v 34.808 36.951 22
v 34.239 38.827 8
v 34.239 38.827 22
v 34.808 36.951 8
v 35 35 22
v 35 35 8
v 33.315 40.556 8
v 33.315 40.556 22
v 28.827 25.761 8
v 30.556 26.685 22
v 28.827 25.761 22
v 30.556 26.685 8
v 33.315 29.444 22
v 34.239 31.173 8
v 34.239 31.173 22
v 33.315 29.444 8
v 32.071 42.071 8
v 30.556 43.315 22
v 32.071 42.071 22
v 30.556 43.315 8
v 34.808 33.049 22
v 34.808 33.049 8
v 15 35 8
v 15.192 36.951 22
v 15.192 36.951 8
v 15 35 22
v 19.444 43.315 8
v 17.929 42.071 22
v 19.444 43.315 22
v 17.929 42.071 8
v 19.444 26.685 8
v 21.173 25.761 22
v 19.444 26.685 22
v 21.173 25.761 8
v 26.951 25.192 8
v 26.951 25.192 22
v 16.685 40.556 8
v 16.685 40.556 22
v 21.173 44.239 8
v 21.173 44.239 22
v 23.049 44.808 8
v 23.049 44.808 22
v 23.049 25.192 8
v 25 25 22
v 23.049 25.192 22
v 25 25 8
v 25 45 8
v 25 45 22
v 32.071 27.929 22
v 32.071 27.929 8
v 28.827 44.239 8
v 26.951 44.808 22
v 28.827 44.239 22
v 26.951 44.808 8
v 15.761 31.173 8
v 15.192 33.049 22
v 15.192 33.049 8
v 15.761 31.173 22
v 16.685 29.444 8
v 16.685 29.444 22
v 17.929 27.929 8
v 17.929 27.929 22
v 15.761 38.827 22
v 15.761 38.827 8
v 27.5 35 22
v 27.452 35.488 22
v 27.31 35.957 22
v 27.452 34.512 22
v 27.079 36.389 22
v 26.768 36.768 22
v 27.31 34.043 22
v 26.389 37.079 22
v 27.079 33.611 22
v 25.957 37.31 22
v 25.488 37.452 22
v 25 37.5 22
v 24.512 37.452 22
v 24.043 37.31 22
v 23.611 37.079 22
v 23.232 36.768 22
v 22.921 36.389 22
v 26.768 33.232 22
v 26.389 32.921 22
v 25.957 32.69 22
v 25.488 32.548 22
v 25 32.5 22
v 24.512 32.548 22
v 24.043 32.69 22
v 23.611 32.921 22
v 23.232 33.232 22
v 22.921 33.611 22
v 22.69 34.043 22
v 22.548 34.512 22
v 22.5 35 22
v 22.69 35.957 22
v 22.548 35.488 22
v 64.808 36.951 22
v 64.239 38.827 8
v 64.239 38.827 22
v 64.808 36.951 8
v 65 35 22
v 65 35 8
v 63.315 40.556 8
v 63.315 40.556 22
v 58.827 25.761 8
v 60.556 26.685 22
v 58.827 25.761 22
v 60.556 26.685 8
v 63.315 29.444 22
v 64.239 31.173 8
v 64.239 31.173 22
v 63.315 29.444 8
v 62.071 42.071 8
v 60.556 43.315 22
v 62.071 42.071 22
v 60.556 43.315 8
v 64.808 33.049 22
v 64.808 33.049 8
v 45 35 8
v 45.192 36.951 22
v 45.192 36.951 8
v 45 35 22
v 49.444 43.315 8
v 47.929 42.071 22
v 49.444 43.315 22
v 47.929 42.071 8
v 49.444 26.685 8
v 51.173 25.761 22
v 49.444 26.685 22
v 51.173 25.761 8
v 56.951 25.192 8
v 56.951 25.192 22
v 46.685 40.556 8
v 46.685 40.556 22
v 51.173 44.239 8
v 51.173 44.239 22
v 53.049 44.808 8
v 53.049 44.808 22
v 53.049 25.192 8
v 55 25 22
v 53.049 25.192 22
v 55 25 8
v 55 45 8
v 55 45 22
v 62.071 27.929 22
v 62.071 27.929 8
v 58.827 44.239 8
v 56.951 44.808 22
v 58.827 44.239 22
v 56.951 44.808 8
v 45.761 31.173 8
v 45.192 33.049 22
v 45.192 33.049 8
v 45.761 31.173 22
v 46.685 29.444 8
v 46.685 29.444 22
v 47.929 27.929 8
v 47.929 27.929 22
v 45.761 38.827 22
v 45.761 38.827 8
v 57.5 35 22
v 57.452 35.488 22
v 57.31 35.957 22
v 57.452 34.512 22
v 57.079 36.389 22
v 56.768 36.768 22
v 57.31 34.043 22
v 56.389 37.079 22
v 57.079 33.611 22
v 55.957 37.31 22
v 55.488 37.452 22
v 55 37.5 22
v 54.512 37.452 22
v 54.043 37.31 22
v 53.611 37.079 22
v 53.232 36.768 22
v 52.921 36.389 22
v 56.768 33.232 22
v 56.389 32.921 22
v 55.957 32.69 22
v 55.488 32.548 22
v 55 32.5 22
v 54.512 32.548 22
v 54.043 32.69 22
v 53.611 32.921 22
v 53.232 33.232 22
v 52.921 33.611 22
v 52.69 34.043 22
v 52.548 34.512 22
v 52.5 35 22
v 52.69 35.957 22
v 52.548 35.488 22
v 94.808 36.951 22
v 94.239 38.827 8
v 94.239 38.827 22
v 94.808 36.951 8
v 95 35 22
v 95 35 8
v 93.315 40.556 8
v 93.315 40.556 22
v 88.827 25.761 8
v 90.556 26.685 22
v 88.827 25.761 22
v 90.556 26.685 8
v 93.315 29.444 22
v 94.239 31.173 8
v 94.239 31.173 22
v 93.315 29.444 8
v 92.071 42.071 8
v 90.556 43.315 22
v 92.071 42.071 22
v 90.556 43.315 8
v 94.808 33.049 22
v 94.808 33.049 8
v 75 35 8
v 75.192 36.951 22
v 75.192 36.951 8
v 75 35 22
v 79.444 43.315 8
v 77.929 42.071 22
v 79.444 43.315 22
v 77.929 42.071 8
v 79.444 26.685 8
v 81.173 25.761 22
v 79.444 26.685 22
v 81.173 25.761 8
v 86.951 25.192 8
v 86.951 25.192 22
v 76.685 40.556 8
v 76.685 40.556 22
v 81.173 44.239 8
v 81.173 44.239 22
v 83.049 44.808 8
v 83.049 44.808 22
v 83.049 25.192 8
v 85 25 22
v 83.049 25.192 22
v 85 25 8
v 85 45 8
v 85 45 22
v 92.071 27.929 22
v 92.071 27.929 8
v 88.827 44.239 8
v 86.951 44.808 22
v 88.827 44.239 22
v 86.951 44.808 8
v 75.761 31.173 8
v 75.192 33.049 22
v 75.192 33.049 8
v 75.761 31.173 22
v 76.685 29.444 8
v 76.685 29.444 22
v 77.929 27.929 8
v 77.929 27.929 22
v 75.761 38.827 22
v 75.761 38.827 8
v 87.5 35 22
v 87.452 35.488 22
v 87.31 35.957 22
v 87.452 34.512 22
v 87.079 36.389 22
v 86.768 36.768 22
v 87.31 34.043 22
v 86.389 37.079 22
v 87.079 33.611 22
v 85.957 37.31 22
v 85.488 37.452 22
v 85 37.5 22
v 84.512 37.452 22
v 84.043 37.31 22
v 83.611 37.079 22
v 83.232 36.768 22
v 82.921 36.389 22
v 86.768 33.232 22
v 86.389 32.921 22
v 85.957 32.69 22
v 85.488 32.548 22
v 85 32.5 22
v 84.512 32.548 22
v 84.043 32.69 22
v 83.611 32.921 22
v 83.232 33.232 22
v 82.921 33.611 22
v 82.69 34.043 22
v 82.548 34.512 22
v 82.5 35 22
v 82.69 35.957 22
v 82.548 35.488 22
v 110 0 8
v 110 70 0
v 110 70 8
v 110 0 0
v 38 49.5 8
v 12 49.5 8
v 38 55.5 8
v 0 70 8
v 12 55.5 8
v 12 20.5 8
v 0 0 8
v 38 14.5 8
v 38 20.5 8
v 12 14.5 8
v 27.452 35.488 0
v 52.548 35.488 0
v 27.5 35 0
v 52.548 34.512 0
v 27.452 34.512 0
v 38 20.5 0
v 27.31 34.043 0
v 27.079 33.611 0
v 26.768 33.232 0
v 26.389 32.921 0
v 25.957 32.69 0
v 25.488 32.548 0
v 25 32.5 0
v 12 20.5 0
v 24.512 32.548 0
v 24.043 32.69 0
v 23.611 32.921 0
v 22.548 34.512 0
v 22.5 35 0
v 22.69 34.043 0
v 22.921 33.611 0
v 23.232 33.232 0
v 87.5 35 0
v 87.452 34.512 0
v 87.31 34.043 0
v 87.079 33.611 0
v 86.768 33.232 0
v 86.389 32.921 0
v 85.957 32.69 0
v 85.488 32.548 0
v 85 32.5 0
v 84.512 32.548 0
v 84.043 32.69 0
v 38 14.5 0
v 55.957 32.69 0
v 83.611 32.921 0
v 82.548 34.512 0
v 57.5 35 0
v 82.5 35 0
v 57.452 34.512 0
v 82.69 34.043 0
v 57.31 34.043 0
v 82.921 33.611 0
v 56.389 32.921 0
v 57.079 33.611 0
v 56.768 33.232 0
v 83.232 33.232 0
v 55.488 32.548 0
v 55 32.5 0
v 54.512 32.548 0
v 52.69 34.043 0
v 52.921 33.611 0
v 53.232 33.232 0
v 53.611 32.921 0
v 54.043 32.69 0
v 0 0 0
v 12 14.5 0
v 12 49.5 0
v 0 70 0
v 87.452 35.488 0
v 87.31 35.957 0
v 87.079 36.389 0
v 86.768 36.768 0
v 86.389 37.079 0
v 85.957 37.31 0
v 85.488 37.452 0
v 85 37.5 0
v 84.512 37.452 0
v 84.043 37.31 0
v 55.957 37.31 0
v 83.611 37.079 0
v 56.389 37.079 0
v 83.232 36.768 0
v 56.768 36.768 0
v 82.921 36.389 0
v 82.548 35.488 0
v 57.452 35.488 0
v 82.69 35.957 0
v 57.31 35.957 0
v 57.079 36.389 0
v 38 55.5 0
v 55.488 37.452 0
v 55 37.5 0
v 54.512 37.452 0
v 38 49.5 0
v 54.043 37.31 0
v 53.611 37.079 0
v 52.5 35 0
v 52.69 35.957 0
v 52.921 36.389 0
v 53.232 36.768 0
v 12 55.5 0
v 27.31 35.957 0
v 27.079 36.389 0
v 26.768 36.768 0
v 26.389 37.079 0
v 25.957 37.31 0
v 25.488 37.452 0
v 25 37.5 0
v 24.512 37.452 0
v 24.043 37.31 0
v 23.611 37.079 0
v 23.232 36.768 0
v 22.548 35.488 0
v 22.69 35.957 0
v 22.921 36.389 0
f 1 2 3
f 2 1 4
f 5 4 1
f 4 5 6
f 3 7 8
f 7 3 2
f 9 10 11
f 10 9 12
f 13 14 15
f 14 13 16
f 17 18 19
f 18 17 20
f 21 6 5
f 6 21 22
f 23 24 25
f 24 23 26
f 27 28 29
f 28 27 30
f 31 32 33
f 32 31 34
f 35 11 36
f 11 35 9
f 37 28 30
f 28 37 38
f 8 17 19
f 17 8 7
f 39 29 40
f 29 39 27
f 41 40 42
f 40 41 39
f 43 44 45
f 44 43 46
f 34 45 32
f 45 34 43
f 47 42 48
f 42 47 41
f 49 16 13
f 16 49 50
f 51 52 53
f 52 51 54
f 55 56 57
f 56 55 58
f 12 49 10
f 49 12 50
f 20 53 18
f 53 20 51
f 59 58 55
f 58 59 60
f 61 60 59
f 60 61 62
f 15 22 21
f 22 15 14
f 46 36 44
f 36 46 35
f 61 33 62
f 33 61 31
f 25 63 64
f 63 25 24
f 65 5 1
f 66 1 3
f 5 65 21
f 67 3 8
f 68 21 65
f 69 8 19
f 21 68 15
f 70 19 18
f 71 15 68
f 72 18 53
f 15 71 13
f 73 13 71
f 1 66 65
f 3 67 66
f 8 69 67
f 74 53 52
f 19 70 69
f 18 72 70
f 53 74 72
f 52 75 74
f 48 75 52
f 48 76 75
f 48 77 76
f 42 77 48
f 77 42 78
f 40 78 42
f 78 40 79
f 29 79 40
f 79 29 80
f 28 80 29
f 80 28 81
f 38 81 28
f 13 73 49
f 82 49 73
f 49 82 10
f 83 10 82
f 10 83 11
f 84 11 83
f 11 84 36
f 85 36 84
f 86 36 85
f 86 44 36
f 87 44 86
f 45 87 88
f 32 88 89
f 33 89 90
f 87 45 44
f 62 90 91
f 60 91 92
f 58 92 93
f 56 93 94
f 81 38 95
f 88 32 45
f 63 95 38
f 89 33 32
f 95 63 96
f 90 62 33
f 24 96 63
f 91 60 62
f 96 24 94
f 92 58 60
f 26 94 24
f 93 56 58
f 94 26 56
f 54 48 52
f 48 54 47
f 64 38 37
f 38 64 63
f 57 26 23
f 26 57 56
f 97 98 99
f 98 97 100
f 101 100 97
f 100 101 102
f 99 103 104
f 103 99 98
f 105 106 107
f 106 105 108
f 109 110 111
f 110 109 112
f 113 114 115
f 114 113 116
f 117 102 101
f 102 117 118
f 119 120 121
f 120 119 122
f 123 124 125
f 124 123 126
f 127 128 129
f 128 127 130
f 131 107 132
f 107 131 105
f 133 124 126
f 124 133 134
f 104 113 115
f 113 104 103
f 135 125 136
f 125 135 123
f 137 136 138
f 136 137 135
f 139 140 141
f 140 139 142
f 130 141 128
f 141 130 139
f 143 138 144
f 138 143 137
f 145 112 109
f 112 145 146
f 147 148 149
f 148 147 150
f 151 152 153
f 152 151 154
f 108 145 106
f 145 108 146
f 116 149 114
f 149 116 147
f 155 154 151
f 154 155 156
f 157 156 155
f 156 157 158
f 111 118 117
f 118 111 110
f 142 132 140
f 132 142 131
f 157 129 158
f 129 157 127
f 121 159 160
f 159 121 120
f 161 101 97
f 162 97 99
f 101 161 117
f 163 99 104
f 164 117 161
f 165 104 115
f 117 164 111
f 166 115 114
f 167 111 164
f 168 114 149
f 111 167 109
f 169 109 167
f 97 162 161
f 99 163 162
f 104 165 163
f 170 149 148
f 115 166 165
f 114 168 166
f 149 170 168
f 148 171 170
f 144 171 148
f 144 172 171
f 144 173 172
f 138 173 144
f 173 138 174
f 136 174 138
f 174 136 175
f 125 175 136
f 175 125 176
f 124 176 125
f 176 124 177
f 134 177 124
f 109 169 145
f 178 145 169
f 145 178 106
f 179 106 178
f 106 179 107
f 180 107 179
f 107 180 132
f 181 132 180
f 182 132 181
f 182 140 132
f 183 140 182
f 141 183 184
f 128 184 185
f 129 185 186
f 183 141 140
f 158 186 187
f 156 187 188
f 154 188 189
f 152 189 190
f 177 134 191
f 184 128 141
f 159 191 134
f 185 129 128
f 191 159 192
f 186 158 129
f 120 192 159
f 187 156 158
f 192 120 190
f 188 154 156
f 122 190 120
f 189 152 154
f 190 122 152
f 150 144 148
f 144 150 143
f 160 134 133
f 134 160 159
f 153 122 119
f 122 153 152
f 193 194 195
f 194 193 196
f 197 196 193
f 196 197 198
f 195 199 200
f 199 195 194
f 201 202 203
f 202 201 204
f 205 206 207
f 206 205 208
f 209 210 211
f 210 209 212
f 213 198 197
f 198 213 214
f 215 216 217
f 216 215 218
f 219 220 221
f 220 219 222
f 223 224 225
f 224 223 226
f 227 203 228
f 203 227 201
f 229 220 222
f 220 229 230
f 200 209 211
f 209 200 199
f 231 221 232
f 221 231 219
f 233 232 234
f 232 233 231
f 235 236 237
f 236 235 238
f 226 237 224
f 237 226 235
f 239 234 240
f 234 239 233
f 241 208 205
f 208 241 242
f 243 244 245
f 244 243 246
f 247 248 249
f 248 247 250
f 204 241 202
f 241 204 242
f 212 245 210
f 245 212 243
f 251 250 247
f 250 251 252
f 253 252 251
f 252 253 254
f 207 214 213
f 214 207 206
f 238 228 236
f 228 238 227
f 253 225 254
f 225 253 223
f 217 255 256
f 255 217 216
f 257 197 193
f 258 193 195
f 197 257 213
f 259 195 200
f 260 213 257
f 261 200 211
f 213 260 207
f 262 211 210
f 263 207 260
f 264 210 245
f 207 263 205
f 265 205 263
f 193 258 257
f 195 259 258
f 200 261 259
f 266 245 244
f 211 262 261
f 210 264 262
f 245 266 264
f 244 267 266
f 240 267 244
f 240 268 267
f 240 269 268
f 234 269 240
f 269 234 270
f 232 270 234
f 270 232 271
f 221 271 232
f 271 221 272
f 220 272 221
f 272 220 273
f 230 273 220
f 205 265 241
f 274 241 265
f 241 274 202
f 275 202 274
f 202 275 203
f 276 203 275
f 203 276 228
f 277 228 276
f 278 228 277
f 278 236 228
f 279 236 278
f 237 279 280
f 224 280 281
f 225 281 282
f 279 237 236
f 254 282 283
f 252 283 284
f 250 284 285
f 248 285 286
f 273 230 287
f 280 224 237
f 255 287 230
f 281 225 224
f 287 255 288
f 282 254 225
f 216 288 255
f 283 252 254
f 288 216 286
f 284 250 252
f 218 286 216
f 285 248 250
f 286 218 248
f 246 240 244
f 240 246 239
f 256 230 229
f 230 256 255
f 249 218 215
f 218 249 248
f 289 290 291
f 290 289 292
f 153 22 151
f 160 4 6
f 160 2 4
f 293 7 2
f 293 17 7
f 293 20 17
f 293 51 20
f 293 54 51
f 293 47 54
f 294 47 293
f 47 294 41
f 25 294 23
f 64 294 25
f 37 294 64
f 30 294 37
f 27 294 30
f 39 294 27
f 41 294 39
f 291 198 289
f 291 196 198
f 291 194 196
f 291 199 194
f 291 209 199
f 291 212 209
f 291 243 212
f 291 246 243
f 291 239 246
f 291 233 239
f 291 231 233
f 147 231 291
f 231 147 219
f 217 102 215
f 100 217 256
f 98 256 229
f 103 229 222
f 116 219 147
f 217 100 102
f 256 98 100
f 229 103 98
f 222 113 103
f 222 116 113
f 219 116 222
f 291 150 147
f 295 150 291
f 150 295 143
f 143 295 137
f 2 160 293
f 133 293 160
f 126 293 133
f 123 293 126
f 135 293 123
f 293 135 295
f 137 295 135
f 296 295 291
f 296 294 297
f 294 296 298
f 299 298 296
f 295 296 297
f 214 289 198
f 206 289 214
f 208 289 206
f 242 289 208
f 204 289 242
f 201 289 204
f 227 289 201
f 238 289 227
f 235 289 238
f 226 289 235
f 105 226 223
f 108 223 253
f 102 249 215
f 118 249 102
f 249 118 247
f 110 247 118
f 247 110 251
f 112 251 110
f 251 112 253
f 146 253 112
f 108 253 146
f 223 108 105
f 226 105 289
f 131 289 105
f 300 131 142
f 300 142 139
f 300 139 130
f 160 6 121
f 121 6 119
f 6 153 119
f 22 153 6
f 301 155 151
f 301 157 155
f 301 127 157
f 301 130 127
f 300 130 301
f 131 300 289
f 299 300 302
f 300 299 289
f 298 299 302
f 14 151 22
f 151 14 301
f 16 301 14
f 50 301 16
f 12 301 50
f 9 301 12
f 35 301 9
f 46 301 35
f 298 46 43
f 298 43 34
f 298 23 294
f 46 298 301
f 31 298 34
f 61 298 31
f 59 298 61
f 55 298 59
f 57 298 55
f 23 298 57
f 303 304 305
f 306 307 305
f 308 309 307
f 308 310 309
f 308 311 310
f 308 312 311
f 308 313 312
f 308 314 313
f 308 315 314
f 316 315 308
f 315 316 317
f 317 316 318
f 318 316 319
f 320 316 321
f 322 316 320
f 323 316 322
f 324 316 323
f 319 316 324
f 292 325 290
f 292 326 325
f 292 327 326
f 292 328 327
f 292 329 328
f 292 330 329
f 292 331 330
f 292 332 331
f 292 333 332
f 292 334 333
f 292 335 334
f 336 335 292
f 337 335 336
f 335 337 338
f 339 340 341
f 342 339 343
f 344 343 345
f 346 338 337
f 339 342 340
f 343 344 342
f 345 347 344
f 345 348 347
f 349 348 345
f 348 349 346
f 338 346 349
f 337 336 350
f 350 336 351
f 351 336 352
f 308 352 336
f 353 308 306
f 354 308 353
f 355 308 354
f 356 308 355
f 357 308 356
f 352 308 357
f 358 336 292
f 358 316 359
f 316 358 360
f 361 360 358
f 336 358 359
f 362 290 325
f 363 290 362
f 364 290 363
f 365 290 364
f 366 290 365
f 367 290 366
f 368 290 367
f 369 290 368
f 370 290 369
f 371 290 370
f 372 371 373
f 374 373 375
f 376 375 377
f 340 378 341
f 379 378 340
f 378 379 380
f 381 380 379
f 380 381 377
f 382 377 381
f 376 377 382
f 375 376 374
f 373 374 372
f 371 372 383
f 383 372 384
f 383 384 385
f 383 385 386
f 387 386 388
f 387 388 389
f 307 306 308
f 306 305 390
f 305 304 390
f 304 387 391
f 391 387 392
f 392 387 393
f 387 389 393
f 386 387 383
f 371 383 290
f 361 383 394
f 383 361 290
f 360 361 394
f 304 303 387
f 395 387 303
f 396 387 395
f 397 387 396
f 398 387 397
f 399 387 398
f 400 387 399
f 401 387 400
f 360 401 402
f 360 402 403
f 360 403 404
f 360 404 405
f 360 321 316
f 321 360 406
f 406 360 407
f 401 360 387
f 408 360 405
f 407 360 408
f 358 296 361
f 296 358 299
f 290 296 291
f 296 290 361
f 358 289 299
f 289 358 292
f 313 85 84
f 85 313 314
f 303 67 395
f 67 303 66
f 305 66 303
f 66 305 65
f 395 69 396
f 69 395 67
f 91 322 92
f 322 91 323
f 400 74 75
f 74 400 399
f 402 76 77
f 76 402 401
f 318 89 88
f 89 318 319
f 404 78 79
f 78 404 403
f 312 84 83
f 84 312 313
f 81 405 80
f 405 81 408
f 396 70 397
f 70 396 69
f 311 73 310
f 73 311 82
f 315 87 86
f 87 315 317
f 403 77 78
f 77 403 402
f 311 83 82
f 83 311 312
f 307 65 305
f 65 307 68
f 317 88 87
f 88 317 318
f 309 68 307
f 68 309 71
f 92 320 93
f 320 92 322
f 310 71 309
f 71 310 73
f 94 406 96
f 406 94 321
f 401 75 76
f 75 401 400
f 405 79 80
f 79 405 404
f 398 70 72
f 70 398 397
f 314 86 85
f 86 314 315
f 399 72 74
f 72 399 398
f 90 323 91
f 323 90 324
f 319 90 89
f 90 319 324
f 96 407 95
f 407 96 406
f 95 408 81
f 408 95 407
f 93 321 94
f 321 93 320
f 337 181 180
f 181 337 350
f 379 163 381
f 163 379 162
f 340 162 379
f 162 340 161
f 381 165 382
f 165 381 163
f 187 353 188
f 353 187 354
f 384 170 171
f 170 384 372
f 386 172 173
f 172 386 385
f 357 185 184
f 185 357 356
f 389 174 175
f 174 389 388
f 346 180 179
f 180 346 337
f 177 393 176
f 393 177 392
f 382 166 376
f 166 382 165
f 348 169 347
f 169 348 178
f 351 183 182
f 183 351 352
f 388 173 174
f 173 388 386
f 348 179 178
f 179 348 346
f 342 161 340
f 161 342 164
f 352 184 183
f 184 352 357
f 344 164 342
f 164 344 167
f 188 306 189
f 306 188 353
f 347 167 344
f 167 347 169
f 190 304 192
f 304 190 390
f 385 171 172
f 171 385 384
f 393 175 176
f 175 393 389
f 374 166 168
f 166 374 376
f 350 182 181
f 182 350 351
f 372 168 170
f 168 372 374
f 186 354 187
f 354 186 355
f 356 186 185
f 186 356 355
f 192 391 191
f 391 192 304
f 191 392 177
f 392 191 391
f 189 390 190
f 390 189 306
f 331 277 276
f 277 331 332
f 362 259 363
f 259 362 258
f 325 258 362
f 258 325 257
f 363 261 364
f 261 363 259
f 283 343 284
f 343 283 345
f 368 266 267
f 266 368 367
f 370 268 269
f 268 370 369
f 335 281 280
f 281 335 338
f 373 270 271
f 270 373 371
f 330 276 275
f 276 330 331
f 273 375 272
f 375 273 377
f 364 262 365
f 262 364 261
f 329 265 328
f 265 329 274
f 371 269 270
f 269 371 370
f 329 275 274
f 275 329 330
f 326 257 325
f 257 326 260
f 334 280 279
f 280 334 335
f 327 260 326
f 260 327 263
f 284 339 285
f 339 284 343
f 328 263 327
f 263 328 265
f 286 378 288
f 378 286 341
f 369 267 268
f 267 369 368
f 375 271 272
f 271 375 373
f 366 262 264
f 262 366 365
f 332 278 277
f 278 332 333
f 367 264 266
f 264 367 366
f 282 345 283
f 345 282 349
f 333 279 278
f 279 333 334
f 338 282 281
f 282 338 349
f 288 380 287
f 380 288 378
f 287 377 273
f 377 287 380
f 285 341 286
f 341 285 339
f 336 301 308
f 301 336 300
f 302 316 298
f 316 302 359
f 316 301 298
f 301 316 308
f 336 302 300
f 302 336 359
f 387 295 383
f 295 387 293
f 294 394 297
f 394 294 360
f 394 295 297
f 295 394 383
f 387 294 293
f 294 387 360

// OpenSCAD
$fn = 32;

// ----------------------------------------------------------------------
// Drill jig: three_boss_slot jig
// ----------------------------------------------------------------------

// --- parameters (mm) ---
plate_l = 110;            // plate length, X
plate_w = 70;             // plate width, Y
plate_t = 8;              // plate thickness
boss_d = 20;              // guide boss diameter
boss_h = 15;              // boss height above the plate
guide_d = 5;              // guide hole diameter
boss_pitch = 30;          // boss pitch
slot_w = 6;               // clamp slot width
slot_l = 26;              // clamp slot length
slot_x = 12;              // slot start X
fit_tol = 0.05;           // tolerance for press fits, mm
free_tol = 0.2;           // tolerance for clearance fits, mm

n_boss = 3;  // guide bosses
boss_x0 = (plate_l - (n_boss - 1) * boss_pitch) / 2;  // first boss X
boss_top = plate_t - 1 + boss_h;  // boss crown height
total_h = boss_top;  // overall height

difference() {
  union() {
  cube([plate_l, plate_w, plate_t]);
  for (i = [0 : n_boss - 1])
    translate([boss_x0 + i * boss_pitch, plate_w / 2, plate_t - 1])
      cylinder(h = boss_h, d = boss_d);
  }
  for (i = [0 : n_boss - 1])
    translate([boss_x0 + i * boss_pitch, plate_w / 2, -1])
      cylinder(h = plate_t + boss_h, d = guide_d);
  for (cy = [plate_w * 0.25, plate_w * 0.75])
    translate([slot_x, cy - slot_w / 2, -1])
      cube([slot_l, slot_w, plate_t + 2]);
}
